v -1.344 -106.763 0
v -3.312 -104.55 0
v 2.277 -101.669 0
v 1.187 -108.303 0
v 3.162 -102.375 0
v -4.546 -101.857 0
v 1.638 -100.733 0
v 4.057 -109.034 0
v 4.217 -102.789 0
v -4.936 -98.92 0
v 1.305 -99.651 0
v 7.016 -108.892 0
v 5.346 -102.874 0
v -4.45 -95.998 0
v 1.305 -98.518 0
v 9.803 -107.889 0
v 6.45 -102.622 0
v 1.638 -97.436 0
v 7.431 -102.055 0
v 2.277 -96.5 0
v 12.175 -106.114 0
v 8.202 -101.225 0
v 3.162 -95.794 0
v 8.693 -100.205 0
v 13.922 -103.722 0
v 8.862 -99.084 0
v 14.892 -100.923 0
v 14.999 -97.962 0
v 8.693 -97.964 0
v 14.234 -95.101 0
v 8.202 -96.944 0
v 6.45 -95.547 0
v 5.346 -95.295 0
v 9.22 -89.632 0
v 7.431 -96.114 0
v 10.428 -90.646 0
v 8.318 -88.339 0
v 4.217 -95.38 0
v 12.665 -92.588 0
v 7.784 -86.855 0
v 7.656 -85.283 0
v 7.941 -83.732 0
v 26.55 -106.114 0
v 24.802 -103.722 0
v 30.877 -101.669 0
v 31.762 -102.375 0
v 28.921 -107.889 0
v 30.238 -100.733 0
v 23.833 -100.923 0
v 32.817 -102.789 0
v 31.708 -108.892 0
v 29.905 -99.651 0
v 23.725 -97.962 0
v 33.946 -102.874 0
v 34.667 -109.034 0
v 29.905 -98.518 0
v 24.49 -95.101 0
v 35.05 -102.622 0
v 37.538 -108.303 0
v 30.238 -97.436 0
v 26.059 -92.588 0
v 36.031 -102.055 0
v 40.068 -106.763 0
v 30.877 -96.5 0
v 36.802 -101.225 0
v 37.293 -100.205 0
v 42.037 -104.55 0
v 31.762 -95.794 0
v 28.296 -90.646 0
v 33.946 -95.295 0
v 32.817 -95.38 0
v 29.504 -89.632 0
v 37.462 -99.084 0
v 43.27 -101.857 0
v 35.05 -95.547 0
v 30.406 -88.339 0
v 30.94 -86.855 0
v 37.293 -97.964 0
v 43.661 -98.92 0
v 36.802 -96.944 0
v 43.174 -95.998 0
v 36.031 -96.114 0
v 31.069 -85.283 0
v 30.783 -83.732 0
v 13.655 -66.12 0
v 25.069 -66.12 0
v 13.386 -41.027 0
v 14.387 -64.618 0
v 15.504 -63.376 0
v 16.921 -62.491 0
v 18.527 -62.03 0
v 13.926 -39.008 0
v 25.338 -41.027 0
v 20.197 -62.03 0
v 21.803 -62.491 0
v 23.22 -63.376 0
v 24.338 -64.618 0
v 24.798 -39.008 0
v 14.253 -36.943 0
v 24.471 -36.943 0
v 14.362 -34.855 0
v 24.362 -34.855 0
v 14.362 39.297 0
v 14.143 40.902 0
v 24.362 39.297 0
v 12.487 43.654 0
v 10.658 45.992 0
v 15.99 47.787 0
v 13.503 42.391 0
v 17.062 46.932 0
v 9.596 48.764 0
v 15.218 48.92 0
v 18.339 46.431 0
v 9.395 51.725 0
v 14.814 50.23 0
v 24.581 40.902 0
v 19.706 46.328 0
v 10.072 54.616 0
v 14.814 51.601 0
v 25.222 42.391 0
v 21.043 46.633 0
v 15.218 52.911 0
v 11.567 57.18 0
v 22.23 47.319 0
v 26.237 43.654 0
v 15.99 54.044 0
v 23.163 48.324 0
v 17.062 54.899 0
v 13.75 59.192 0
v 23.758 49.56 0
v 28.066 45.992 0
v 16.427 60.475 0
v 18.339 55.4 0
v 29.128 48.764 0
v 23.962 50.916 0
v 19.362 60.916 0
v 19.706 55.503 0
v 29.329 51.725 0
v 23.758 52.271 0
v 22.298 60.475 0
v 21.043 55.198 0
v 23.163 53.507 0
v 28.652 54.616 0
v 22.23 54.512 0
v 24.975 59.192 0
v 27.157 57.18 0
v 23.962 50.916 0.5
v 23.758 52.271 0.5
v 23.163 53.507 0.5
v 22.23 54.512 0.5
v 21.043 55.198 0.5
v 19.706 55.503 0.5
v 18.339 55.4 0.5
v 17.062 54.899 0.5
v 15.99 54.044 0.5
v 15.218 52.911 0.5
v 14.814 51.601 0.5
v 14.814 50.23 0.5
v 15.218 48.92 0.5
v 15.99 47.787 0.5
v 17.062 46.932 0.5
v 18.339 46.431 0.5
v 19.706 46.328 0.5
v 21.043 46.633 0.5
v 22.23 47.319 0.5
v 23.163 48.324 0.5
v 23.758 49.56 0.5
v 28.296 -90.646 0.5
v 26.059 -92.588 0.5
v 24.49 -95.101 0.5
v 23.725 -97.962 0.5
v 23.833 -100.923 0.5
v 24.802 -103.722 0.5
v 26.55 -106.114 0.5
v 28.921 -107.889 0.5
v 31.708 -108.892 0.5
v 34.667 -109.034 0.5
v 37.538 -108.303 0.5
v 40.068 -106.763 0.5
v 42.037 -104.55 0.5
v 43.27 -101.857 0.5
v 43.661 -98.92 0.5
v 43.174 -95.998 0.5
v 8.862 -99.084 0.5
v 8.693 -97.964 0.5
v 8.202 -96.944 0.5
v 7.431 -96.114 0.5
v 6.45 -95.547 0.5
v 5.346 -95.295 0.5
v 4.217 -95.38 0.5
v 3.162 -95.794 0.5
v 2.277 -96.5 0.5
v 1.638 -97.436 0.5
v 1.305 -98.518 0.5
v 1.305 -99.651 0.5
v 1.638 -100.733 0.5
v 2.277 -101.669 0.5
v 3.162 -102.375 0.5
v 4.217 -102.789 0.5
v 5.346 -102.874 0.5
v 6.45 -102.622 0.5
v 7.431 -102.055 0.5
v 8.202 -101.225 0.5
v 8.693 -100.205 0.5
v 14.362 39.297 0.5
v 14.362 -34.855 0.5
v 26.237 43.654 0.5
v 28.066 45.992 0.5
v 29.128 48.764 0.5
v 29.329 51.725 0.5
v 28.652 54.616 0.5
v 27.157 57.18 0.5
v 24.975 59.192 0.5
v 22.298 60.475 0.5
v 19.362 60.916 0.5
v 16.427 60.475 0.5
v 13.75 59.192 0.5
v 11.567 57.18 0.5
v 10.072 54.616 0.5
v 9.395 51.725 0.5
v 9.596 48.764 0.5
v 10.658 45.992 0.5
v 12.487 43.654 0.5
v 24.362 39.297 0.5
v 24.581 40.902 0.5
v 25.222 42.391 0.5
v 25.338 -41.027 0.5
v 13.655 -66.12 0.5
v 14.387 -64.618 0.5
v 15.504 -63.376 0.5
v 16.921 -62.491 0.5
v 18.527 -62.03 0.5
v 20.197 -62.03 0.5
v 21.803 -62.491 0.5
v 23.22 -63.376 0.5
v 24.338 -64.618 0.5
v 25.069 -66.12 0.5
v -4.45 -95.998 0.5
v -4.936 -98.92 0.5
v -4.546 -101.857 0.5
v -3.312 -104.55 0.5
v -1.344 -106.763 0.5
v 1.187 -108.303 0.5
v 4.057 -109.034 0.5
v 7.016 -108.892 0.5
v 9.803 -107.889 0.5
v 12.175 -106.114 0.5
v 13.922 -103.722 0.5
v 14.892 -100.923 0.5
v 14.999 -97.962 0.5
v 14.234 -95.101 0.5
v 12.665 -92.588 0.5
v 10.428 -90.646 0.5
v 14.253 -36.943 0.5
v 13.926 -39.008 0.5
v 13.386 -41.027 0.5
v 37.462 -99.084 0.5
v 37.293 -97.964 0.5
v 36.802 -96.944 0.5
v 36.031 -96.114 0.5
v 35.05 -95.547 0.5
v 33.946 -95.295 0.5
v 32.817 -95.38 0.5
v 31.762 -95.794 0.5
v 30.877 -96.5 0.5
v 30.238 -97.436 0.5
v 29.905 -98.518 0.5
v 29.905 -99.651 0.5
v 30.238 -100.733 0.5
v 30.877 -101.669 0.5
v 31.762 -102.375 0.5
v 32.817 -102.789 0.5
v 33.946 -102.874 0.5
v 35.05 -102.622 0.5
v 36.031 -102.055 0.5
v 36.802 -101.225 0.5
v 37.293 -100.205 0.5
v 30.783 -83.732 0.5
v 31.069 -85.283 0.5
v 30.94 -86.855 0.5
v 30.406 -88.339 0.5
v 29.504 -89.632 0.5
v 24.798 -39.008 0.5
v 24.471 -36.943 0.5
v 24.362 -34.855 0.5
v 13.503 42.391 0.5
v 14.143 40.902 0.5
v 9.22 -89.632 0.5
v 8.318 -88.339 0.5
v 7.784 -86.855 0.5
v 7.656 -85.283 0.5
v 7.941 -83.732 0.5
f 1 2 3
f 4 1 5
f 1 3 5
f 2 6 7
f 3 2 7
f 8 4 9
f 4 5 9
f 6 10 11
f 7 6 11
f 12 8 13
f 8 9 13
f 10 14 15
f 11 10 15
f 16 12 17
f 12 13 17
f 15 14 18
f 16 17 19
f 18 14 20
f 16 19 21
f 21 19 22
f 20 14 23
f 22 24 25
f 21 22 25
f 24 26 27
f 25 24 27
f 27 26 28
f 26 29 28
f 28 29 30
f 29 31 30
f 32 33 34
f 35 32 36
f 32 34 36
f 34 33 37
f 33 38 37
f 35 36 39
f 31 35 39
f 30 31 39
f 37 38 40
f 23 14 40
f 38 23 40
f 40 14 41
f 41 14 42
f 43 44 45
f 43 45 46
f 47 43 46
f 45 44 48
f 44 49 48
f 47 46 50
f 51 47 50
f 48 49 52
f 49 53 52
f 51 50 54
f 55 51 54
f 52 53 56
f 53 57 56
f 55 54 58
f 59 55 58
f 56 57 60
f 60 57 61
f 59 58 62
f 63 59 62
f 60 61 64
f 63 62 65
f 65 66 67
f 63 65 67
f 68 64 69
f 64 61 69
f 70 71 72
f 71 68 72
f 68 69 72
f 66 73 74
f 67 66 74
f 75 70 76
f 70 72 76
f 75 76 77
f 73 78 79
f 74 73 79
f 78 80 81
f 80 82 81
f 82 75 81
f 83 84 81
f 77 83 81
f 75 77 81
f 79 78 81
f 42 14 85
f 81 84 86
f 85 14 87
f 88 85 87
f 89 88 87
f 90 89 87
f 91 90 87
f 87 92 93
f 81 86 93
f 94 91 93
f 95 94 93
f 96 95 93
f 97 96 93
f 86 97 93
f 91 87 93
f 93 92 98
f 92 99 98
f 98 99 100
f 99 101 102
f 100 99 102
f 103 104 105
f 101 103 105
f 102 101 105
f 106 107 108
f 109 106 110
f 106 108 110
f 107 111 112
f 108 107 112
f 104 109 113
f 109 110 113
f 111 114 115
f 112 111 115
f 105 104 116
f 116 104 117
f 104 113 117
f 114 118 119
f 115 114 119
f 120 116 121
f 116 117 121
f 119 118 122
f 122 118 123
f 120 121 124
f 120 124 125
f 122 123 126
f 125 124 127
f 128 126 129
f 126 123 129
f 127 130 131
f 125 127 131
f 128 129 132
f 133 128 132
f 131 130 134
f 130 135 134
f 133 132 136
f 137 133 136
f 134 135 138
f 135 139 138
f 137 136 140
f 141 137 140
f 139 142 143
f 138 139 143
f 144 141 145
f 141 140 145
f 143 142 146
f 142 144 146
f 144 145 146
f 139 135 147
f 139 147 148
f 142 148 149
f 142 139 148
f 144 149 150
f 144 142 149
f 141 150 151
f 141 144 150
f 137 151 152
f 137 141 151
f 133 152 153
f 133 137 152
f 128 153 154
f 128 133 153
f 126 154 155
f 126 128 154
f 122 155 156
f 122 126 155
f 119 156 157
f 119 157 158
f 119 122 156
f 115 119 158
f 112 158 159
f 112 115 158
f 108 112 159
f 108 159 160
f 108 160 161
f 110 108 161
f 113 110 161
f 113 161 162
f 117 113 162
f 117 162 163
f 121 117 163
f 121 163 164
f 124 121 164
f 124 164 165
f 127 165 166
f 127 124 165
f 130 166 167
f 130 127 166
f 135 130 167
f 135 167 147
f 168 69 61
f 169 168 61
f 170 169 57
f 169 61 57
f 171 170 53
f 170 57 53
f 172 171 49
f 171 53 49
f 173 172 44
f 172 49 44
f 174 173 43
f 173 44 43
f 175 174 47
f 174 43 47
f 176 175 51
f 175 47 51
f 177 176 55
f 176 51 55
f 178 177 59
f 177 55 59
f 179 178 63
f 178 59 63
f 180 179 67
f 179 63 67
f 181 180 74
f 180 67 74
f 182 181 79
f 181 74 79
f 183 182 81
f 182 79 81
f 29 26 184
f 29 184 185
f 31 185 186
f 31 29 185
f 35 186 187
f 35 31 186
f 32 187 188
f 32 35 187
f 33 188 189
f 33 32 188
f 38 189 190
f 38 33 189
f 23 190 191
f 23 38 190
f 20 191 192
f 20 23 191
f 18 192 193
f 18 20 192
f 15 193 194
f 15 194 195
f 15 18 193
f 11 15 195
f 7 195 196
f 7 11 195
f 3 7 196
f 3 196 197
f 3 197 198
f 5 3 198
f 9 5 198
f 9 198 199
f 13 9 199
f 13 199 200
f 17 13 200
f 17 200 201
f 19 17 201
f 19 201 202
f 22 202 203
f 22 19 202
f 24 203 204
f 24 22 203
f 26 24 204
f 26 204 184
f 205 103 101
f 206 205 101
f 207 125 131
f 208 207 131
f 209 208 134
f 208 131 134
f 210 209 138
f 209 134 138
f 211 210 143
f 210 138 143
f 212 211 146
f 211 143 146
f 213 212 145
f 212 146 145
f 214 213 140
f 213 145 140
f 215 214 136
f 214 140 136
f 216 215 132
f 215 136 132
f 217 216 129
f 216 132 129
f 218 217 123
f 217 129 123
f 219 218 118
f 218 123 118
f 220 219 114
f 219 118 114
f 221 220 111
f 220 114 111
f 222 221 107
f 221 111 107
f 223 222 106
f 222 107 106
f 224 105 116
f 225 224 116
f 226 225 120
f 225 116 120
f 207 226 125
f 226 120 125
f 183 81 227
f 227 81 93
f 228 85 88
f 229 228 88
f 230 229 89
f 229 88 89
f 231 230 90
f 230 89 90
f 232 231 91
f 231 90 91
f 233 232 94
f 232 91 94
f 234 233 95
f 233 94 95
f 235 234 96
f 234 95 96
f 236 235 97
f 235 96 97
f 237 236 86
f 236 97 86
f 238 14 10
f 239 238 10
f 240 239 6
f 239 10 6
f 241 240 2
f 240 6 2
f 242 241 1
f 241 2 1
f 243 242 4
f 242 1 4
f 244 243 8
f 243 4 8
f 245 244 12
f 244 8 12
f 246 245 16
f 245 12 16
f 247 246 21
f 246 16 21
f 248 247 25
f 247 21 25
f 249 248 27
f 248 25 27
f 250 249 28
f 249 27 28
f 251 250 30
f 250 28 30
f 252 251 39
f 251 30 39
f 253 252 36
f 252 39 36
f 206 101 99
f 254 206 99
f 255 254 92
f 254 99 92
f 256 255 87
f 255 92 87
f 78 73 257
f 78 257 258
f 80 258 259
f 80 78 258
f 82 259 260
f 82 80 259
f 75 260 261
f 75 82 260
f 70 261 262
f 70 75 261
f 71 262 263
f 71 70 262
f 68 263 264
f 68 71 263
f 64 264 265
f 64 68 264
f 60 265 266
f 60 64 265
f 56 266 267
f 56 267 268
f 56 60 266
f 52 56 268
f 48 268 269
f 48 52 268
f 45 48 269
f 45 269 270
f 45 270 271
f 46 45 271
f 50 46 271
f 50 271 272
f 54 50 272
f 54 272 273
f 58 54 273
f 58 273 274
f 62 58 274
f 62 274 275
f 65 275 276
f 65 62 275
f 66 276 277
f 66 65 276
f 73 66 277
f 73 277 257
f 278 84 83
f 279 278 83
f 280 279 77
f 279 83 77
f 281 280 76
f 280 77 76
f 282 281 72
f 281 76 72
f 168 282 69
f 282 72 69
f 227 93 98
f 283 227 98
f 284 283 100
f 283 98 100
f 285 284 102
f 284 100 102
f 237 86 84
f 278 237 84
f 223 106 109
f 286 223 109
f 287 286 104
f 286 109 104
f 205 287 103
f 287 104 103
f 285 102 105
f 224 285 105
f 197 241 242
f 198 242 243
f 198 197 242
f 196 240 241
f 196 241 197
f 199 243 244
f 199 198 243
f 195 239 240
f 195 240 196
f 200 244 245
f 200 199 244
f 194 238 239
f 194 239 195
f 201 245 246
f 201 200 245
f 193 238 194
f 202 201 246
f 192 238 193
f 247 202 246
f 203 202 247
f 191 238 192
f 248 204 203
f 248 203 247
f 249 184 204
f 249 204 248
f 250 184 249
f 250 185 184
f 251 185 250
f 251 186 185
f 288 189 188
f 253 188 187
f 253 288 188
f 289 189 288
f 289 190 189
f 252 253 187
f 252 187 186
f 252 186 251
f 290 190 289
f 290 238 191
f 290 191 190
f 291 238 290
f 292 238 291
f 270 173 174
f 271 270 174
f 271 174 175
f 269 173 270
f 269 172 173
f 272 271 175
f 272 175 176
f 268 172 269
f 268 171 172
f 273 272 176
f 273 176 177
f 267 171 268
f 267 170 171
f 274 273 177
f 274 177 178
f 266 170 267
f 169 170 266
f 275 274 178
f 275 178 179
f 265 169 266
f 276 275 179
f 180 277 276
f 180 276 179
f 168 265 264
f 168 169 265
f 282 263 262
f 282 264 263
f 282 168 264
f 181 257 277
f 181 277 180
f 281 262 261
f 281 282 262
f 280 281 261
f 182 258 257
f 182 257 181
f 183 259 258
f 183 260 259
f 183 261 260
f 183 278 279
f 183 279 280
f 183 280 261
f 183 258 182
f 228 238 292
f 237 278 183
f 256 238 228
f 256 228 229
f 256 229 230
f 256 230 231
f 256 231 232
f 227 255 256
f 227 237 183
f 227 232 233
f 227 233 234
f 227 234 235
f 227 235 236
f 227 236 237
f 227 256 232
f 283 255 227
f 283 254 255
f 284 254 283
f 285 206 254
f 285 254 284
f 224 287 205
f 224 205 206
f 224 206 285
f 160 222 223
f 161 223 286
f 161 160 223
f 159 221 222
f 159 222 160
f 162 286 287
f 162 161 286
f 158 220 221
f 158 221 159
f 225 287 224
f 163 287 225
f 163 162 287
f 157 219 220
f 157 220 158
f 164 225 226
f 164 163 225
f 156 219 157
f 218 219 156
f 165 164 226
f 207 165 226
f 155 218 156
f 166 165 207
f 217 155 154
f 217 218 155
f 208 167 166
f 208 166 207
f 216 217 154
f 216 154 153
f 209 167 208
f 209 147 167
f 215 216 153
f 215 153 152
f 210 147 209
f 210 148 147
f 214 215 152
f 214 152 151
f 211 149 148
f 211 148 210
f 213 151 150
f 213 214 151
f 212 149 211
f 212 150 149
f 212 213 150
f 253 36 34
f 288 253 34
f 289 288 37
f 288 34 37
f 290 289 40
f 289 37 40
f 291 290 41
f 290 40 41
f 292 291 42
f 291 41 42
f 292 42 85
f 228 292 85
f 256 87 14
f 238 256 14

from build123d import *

# Parameters (mm, degrees)
F0_R     = 3.8
F0_R_2   = 4.6
F1_DEPTH = 0.5


# Not quite as in the source:
# - a feature names something its author has since deleted; it is built from what else it names


with BuildPart() as f1:
    # F0 (on Top) → F1 (new body)
    with BuildSketch(Plane.XY):
        with BuildLine():
            ThreePointArc((24.3621806055, 39.2965673213), (24.8508286843, 41.6682755665), (26.2371806055, 43.6536735858))
            ThreePointArc((26.2371806055, 43.6536735858), (19.3621806055, 60.91551736), (12.4871806055, 43.6536735858))
            ThreePointArc((12.4871806055, 43.6536735858), (13.8735325268, 41.6682755665), (14.3621806055, 39.2965673213))
            Line((14.3621806055, 39.2965673213), (14.3621806055, -34.8549244096))
            ThreePointArc((14.3621806055, -34.8549244096), (14.1166056215, -37.9794551404), (13.3859113767, -41.0272552129))
            Line((13.3859113767, -41.0272552129), (-4.4496847801, -95.9983172384))
            ThreePointArc((-4.4496847801, -95.9983172384), (8.4471568034, -108.4941551178), (10.428313753, -90.646199933))
            ThreePointArc((10.428313753, -90.646199933), (8.0021901548, -87.6142160275), (7.9408744101, -83.7315310678))
            Line((7.9408744101, -83.7315310678), (13.6550613742, -66.1198446814))
            ThreePointArc((13.6550613742, -66.1198446814), (19.3621806055, -61.9715439224), (25.0692998369, -66.1198446814))
            Line((25.0692998369, -66.1198446814), (30.783486801, -83.7315310678))
            ThreePointArc((30.783486801, -83.7315310678), (30.7221710563, -87.6142160275), (28.2960474581, -90.646199933))
            ThreePointArc((28.2960474581, -90.646199933), (30.2772044076, -108.4941551178), (43.1740459911, -95.9983172384))
            Line((43.1740459911, -95.9983172384), (25.3384498343, -41.0272552129))
            ThreePointArc((25.3384498343, -41.0272552129), (24.6077555896, -37.9794551404), (24.3621806055, -34.8549244096))
            Line((24.3621806055, -34.8549244096), (24.3621806055, 39.2965673213))
        make_face()
        with Locations((5.0621806055, -99.08448264)):
            Circle(F0_R, mode=Mode.SUBTRACT)
        with Locations((33.6621806055, -99.08448264)):
            Circle(F0_R, mode=Mode.SUBTRACT)
        with Locations((19.3621806055, 50.91551736)):
            Circle(F0_R_2, mode=Mode.SUBTRACT)
    extrude(amount=F1_DEPTH)


solid = f1.part
